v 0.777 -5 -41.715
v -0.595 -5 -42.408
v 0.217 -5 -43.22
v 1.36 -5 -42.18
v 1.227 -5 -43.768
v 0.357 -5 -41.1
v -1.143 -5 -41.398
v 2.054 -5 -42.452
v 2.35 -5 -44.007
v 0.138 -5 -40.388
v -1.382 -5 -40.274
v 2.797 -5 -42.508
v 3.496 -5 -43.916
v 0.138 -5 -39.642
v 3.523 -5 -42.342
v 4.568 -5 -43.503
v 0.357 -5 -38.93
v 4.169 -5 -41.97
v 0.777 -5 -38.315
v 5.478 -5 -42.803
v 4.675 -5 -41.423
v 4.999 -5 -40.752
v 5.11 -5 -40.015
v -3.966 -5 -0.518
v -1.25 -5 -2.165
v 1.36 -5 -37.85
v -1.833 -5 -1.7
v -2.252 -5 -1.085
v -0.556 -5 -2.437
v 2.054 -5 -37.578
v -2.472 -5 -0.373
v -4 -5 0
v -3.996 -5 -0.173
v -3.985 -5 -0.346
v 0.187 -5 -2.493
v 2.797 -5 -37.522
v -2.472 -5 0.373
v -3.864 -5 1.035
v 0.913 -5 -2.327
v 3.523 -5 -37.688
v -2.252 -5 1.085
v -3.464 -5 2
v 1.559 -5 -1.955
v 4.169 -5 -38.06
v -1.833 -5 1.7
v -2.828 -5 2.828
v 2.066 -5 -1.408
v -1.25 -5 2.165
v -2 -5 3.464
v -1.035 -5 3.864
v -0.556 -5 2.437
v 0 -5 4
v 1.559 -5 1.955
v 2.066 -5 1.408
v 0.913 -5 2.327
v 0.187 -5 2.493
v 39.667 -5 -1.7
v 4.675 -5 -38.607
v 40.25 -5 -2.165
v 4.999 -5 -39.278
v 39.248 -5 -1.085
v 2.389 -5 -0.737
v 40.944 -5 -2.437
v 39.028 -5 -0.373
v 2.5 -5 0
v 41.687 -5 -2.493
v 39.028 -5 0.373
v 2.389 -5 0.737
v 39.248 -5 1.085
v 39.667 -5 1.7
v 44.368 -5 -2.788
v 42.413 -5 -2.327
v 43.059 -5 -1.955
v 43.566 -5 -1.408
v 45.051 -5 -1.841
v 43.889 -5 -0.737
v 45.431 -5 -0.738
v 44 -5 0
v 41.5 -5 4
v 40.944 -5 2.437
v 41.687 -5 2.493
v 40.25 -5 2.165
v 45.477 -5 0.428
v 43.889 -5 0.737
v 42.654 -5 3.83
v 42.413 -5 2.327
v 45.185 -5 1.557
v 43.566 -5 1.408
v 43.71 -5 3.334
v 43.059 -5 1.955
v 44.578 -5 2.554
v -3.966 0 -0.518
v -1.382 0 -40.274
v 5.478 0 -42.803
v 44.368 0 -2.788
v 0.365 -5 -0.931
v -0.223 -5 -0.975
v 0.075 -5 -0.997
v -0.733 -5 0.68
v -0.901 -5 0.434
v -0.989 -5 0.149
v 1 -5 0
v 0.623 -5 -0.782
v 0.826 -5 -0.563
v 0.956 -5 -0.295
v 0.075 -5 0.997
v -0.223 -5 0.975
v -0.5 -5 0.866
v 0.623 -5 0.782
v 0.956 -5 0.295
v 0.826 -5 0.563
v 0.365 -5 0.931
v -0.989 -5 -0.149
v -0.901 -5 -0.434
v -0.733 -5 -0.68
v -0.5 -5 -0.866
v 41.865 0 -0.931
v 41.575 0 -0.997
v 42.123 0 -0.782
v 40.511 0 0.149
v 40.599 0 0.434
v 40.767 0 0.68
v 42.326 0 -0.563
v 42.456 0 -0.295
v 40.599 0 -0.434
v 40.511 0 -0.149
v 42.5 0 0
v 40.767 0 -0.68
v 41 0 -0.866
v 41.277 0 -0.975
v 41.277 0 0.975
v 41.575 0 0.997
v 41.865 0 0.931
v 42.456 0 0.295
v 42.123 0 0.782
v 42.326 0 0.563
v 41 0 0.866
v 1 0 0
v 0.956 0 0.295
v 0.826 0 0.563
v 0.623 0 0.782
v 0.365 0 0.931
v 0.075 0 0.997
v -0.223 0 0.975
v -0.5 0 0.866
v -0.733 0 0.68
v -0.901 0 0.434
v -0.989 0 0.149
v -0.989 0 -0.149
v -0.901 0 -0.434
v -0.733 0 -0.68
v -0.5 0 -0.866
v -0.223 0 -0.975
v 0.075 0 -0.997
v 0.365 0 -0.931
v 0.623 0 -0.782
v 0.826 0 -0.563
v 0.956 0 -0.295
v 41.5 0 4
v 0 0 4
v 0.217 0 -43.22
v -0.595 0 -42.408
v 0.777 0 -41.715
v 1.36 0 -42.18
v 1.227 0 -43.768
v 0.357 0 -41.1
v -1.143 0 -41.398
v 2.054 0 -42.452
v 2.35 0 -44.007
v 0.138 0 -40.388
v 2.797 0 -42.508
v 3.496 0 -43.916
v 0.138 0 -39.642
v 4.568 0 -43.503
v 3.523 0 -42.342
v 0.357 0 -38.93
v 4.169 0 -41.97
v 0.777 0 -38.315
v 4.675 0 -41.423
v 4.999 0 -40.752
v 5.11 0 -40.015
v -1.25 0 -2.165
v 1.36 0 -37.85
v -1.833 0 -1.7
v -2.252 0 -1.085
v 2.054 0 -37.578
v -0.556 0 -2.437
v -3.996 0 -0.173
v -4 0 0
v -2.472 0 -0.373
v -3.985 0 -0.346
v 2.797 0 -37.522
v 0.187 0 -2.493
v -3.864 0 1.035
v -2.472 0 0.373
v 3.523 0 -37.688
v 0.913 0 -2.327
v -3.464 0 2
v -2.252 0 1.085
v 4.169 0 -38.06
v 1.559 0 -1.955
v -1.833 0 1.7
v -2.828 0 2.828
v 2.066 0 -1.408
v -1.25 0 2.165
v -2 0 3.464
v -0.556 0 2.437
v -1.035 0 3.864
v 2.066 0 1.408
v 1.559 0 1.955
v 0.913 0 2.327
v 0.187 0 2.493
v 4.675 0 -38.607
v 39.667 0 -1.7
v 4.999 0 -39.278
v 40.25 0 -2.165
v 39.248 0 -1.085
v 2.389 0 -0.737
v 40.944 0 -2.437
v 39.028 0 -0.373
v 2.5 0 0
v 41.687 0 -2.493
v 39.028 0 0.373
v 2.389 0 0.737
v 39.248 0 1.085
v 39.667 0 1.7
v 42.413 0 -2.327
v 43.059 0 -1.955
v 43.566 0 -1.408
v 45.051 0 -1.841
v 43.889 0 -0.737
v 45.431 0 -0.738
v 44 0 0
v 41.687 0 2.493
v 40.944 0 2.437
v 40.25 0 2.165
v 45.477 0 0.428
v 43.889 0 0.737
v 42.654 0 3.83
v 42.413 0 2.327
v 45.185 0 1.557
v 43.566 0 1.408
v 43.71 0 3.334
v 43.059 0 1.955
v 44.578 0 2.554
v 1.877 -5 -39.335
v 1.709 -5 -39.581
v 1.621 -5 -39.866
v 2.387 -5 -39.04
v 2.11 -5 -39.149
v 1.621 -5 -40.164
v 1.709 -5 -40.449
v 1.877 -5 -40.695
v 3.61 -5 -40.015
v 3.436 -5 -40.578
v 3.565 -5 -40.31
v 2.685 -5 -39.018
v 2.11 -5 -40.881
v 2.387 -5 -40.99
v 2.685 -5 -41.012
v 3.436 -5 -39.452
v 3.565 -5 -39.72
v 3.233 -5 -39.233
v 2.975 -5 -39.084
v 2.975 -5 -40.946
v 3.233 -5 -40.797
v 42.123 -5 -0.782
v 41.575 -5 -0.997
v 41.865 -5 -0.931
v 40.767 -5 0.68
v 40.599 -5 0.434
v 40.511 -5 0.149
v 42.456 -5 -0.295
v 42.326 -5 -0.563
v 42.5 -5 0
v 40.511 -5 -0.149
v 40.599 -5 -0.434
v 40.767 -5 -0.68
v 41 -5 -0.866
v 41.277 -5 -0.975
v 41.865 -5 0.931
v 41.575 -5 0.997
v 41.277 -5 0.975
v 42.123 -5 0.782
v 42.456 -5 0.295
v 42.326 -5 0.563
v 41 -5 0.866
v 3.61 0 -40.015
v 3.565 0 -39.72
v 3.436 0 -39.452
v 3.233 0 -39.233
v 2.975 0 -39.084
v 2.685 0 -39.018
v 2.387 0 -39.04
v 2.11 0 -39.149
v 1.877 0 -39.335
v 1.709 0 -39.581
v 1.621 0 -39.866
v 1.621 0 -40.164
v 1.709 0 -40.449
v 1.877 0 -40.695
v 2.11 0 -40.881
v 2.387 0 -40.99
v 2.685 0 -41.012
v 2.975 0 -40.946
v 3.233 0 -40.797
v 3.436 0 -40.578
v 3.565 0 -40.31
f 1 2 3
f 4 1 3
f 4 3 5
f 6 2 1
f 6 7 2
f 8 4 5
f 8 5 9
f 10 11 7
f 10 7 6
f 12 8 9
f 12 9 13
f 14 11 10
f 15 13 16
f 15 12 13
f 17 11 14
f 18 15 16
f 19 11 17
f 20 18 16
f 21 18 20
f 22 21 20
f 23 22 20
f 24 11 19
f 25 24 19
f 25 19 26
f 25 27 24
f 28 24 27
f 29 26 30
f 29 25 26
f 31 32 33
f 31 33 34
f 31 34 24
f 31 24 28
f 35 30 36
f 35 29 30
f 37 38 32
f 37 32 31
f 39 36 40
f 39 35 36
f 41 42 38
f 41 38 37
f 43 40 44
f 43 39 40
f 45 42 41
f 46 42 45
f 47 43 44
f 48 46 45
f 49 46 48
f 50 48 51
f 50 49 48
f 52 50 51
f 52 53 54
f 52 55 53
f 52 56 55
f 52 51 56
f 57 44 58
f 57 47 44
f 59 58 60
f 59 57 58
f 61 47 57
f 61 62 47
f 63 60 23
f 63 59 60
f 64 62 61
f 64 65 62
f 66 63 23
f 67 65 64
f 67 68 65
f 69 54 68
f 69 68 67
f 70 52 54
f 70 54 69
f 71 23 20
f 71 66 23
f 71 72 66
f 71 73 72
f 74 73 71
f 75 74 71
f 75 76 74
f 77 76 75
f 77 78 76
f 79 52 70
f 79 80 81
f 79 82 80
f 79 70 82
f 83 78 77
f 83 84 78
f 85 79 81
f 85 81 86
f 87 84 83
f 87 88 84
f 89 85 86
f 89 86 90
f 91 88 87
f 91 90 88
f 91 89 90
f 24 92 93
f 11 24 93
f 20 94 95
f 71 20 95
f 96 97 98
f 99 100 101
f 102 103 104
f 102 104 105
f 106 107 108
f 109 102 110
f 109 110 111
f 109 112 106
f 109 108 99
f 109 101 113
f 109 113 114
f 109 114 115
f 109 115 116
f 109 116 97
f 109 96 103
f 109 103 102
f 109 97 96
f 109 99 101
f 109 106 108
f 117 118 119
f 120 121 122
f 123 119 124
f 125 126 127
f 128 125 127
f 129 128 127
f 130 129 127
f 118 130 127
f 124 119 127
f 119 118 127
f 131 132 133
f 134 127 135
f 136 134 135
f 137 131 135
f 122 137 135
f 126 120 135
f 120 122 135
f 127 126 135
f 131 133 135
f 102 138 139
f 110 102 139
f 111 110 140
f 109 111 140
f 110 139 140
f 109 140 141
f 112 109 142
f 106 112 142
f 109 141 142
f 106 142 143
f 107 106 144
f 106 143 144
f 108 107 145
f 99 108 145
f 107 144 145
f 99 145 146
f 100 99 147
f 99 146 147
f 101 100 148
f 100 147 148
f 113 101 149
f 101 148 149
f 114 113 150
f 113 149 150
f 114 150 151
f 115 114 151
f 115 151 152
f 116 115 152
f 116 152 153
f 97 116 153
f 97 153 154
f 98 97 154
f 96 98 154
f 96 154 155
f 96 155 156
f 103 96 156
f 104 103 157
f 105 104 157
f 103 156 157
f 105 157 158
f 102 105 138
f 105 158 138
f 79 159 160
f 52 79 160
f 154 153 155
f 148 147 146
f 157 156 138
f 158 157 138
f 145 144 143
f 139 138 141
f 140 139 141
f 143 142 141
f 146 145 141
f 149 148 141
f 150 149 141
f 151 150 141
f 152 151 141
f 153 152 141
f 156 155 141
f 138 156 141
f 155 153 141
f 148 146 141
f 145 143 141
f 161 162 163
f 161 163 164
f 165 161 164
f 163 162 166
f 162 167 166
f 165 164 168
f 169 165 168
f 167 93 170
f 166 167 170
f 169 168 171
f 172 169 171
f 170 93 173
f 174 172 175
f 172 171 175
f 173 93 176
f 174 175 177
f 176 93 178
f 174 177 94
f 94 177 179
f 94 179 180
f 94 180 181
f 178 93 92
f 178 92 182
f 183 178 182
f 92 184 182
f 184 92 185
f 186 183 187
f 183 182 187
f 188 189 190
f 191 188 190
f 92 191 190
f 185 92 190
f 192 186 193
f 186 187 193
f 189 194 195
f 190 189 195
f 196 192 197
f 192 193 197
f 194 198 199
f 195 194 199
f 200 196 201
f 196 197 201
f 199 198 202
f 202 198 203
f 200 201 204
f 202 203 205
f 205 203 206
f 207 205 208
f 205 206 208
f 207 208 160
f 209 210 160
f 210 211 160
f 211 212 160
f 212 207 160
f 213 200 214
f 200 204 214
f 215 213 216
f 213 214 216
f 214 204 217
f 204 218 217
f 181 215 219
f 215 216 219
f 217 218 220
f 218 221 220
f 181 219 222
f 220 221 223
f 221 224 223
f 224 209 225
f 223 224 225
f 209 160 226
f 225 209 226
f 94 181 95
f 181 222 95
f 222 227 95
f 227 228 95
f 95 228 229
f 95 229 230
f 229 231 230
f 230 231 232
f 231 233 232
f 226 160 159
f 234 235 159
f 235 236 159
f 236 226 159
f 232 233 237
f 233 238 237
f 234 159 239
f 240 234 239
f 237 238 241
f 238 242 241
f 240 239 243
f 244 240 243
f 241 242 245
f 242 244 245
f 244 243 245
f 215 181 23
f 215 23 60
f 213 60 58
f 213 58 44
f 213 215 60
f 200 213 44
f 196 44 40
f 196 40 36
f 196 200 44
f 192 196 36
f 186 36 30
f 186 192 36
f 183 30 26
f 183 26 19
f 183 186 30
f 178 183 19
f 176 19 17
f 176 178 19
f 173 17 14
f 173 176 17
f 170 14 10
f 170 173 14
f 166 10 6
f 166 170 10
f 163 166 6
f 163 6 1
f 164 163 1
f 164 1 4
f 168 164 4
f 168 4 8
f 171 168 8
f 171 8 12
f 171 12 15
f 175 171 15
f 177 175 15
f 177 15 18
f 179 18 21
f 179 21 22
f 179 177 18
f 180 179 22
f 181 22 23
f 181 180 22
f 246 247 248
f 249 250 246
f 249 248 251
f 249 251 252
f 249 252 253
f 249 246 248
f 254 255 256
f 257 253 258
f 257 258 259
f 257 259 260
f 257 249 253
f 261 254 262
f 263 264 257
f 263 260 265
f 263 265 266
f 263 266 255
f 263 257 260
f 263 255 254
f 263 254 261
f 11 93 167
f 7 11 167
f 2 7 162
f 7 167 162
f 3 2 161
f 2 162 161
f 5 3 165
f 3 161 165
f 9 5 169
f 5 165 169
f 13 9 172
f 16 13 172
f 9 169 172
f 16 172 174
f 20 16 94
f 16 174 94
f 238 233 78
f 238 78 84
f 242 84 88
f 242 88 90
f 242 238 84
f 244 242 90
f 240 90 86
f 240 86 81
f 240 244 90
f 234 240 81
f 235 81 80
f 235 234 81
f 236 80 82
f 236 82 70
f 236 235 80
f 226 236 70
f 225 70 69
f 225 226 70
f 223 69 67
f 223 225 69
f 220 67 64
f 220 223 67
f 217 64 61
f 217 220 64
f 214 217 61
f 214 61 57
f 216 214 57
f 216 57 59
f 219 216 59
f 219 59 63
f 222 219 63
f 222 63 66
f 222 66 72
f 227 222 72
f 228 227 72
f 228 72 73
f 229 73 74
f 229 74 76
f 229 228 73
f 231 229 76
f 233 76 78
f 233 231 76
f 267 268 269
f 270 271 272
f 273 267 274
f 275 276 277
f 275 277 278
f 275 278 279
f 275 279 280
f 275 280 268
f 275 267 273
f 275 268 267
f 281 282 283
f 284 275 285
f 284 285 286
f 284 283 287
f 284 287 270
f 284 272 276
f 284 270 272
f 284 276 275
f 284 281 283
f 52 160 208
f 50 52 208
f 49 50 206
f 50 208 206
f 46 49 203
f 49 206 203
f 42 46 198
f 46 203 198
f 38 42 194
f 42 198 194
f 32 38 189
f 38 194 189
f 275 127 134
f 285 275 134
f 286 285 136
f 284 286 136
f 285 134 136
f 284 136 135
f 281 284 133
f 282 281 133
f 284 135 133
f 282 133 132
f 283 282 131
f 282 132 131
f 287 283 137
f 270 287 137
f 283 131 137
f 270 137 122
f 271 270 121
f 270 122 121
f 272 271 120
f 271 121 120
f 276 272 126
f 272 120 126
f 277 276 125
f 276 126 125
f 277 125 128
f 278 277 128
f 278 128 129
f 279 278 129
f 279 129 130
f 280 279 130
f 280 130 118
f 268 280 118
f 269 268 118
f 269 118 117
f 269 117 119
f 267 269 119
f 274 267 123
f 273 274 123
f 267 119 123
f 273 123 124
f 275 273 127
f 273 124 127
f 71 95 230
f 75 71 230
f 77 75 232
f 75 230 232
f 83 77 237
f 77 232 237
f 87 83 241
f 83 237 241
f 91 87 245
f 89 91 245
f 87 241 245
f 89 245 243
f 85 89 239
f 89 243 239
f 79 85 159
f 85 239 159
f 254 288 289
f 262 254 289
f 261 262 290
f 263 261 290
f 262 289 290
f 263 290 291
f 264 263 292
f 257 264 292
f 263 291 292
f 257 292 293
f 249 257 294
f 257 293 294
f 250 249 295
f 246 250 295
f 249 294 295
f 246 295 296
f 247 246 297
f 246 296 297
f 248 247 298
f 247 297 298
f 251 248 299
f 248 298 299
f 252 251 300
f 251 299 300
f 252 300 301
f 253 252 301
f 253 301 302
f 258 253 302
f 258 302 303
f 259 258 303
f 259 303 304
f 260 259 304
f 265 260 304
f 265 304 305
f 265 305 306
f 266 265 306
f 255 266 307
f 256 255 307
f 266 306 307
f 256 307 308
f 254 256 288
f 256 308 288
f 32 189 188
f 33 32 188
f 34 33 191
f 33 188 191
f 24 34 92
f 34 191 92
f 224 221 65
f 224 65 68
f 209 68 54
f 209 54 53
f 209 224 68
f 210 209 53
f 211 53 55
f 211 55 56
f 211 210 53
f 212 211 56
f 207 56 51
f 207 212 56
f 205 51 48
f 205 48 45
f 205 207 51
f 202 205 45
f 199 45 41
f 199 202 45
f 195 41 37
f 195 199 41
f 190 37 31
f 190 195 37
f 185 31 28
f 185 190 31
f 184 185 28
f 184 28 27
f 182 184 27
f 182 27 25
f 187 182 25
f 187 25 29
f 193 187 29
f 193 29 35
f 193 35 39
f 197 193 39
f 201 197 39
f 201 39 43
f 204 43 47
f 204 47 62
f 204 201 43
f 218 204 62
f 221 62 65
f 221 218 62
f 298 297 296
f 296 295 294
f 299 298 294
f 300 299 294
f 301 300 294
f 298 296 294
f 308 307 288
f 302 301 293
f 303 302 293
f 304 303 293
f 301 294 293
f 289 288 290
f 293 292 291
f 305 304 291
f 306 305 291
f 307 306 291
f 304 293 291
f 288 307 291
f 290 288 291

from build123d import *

# Parameters (mm, degrees)
F0_R     = 2.5
F0_R_2   = 1
F1_DEPTH = 5


with BuildPart() as f1:
    # F0 (on Front) → F1 (new body)
    with BuildSketch(Plane.XZ):
        with BuildLine():
            Line((41.5, 4), (0, 4))
            ThreePointArc((0, 4), (-2.828427, 2.828427), (-4, 0))
            Line((-4, 0), (-3.96633, -0.517903))
            Line((-3.96633, -0.517903), (-1.381694, -40.274477))
            ThreePointArc((-1.381694, -40.274477), (1.226603, -43.768184), (5.478337, -42.802801))
            Line((5.478337, -42.802801), (44.368457, -2.787822))
            ThreePointArc((44.368457, -2.787822), (45.184514, 1.557034), (41.5, 4))
        make_face()
        with Locations((2.60988, -40.014979)):
            Circle(F0_R, mode=Mode.SUBTRACT)
        Circle(F0_R, mode=Mode.SUBTRACT)
        with Locations((41.5, 0)):
            Circle(F0_R, mode=Mode.SUBTRACT)
        with BuildLine():
            Line((-3.96633, -0.517903), (-4, 0))
            ThreePointArc((-4, 0), (-3.991574, -0.259498), (-3.96633, -0.517903))
        make_face()
        Circle(F0_R_2)
        with Locations((41.5, 0)):
            Circle(F0_R_2)
        with Locations((2.60988, -40.014979)):
            Circle(F0_R_2)
    extrude(amount=F1_DEPTH)


solid = f1.part
